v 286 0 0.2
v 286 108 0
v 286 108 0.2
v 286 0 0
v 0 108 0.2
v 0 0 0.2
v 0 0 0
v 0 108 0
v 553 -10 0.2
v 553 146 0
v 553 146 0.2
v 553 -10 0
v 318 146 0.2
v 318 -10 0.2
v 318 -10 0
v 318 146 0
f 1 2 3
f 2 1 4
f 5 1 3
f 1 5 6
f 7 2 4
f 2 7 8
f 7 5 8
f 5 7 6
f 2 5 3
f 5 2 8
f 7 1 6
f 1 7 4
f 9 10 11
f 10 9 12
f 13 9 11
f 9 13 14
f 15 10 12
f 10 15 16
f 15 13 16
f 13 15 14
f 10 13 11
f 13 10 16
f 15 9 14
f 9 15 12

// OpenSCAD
$fa=4; $fs=0.4;
color("#000000") translate([0.000,0.000,0.000]) cube([286.000,108.000,0.200]);
color("#000000") translate([318.000,-10.000,0.000]) cube([235.000,156.000,0.200]);
